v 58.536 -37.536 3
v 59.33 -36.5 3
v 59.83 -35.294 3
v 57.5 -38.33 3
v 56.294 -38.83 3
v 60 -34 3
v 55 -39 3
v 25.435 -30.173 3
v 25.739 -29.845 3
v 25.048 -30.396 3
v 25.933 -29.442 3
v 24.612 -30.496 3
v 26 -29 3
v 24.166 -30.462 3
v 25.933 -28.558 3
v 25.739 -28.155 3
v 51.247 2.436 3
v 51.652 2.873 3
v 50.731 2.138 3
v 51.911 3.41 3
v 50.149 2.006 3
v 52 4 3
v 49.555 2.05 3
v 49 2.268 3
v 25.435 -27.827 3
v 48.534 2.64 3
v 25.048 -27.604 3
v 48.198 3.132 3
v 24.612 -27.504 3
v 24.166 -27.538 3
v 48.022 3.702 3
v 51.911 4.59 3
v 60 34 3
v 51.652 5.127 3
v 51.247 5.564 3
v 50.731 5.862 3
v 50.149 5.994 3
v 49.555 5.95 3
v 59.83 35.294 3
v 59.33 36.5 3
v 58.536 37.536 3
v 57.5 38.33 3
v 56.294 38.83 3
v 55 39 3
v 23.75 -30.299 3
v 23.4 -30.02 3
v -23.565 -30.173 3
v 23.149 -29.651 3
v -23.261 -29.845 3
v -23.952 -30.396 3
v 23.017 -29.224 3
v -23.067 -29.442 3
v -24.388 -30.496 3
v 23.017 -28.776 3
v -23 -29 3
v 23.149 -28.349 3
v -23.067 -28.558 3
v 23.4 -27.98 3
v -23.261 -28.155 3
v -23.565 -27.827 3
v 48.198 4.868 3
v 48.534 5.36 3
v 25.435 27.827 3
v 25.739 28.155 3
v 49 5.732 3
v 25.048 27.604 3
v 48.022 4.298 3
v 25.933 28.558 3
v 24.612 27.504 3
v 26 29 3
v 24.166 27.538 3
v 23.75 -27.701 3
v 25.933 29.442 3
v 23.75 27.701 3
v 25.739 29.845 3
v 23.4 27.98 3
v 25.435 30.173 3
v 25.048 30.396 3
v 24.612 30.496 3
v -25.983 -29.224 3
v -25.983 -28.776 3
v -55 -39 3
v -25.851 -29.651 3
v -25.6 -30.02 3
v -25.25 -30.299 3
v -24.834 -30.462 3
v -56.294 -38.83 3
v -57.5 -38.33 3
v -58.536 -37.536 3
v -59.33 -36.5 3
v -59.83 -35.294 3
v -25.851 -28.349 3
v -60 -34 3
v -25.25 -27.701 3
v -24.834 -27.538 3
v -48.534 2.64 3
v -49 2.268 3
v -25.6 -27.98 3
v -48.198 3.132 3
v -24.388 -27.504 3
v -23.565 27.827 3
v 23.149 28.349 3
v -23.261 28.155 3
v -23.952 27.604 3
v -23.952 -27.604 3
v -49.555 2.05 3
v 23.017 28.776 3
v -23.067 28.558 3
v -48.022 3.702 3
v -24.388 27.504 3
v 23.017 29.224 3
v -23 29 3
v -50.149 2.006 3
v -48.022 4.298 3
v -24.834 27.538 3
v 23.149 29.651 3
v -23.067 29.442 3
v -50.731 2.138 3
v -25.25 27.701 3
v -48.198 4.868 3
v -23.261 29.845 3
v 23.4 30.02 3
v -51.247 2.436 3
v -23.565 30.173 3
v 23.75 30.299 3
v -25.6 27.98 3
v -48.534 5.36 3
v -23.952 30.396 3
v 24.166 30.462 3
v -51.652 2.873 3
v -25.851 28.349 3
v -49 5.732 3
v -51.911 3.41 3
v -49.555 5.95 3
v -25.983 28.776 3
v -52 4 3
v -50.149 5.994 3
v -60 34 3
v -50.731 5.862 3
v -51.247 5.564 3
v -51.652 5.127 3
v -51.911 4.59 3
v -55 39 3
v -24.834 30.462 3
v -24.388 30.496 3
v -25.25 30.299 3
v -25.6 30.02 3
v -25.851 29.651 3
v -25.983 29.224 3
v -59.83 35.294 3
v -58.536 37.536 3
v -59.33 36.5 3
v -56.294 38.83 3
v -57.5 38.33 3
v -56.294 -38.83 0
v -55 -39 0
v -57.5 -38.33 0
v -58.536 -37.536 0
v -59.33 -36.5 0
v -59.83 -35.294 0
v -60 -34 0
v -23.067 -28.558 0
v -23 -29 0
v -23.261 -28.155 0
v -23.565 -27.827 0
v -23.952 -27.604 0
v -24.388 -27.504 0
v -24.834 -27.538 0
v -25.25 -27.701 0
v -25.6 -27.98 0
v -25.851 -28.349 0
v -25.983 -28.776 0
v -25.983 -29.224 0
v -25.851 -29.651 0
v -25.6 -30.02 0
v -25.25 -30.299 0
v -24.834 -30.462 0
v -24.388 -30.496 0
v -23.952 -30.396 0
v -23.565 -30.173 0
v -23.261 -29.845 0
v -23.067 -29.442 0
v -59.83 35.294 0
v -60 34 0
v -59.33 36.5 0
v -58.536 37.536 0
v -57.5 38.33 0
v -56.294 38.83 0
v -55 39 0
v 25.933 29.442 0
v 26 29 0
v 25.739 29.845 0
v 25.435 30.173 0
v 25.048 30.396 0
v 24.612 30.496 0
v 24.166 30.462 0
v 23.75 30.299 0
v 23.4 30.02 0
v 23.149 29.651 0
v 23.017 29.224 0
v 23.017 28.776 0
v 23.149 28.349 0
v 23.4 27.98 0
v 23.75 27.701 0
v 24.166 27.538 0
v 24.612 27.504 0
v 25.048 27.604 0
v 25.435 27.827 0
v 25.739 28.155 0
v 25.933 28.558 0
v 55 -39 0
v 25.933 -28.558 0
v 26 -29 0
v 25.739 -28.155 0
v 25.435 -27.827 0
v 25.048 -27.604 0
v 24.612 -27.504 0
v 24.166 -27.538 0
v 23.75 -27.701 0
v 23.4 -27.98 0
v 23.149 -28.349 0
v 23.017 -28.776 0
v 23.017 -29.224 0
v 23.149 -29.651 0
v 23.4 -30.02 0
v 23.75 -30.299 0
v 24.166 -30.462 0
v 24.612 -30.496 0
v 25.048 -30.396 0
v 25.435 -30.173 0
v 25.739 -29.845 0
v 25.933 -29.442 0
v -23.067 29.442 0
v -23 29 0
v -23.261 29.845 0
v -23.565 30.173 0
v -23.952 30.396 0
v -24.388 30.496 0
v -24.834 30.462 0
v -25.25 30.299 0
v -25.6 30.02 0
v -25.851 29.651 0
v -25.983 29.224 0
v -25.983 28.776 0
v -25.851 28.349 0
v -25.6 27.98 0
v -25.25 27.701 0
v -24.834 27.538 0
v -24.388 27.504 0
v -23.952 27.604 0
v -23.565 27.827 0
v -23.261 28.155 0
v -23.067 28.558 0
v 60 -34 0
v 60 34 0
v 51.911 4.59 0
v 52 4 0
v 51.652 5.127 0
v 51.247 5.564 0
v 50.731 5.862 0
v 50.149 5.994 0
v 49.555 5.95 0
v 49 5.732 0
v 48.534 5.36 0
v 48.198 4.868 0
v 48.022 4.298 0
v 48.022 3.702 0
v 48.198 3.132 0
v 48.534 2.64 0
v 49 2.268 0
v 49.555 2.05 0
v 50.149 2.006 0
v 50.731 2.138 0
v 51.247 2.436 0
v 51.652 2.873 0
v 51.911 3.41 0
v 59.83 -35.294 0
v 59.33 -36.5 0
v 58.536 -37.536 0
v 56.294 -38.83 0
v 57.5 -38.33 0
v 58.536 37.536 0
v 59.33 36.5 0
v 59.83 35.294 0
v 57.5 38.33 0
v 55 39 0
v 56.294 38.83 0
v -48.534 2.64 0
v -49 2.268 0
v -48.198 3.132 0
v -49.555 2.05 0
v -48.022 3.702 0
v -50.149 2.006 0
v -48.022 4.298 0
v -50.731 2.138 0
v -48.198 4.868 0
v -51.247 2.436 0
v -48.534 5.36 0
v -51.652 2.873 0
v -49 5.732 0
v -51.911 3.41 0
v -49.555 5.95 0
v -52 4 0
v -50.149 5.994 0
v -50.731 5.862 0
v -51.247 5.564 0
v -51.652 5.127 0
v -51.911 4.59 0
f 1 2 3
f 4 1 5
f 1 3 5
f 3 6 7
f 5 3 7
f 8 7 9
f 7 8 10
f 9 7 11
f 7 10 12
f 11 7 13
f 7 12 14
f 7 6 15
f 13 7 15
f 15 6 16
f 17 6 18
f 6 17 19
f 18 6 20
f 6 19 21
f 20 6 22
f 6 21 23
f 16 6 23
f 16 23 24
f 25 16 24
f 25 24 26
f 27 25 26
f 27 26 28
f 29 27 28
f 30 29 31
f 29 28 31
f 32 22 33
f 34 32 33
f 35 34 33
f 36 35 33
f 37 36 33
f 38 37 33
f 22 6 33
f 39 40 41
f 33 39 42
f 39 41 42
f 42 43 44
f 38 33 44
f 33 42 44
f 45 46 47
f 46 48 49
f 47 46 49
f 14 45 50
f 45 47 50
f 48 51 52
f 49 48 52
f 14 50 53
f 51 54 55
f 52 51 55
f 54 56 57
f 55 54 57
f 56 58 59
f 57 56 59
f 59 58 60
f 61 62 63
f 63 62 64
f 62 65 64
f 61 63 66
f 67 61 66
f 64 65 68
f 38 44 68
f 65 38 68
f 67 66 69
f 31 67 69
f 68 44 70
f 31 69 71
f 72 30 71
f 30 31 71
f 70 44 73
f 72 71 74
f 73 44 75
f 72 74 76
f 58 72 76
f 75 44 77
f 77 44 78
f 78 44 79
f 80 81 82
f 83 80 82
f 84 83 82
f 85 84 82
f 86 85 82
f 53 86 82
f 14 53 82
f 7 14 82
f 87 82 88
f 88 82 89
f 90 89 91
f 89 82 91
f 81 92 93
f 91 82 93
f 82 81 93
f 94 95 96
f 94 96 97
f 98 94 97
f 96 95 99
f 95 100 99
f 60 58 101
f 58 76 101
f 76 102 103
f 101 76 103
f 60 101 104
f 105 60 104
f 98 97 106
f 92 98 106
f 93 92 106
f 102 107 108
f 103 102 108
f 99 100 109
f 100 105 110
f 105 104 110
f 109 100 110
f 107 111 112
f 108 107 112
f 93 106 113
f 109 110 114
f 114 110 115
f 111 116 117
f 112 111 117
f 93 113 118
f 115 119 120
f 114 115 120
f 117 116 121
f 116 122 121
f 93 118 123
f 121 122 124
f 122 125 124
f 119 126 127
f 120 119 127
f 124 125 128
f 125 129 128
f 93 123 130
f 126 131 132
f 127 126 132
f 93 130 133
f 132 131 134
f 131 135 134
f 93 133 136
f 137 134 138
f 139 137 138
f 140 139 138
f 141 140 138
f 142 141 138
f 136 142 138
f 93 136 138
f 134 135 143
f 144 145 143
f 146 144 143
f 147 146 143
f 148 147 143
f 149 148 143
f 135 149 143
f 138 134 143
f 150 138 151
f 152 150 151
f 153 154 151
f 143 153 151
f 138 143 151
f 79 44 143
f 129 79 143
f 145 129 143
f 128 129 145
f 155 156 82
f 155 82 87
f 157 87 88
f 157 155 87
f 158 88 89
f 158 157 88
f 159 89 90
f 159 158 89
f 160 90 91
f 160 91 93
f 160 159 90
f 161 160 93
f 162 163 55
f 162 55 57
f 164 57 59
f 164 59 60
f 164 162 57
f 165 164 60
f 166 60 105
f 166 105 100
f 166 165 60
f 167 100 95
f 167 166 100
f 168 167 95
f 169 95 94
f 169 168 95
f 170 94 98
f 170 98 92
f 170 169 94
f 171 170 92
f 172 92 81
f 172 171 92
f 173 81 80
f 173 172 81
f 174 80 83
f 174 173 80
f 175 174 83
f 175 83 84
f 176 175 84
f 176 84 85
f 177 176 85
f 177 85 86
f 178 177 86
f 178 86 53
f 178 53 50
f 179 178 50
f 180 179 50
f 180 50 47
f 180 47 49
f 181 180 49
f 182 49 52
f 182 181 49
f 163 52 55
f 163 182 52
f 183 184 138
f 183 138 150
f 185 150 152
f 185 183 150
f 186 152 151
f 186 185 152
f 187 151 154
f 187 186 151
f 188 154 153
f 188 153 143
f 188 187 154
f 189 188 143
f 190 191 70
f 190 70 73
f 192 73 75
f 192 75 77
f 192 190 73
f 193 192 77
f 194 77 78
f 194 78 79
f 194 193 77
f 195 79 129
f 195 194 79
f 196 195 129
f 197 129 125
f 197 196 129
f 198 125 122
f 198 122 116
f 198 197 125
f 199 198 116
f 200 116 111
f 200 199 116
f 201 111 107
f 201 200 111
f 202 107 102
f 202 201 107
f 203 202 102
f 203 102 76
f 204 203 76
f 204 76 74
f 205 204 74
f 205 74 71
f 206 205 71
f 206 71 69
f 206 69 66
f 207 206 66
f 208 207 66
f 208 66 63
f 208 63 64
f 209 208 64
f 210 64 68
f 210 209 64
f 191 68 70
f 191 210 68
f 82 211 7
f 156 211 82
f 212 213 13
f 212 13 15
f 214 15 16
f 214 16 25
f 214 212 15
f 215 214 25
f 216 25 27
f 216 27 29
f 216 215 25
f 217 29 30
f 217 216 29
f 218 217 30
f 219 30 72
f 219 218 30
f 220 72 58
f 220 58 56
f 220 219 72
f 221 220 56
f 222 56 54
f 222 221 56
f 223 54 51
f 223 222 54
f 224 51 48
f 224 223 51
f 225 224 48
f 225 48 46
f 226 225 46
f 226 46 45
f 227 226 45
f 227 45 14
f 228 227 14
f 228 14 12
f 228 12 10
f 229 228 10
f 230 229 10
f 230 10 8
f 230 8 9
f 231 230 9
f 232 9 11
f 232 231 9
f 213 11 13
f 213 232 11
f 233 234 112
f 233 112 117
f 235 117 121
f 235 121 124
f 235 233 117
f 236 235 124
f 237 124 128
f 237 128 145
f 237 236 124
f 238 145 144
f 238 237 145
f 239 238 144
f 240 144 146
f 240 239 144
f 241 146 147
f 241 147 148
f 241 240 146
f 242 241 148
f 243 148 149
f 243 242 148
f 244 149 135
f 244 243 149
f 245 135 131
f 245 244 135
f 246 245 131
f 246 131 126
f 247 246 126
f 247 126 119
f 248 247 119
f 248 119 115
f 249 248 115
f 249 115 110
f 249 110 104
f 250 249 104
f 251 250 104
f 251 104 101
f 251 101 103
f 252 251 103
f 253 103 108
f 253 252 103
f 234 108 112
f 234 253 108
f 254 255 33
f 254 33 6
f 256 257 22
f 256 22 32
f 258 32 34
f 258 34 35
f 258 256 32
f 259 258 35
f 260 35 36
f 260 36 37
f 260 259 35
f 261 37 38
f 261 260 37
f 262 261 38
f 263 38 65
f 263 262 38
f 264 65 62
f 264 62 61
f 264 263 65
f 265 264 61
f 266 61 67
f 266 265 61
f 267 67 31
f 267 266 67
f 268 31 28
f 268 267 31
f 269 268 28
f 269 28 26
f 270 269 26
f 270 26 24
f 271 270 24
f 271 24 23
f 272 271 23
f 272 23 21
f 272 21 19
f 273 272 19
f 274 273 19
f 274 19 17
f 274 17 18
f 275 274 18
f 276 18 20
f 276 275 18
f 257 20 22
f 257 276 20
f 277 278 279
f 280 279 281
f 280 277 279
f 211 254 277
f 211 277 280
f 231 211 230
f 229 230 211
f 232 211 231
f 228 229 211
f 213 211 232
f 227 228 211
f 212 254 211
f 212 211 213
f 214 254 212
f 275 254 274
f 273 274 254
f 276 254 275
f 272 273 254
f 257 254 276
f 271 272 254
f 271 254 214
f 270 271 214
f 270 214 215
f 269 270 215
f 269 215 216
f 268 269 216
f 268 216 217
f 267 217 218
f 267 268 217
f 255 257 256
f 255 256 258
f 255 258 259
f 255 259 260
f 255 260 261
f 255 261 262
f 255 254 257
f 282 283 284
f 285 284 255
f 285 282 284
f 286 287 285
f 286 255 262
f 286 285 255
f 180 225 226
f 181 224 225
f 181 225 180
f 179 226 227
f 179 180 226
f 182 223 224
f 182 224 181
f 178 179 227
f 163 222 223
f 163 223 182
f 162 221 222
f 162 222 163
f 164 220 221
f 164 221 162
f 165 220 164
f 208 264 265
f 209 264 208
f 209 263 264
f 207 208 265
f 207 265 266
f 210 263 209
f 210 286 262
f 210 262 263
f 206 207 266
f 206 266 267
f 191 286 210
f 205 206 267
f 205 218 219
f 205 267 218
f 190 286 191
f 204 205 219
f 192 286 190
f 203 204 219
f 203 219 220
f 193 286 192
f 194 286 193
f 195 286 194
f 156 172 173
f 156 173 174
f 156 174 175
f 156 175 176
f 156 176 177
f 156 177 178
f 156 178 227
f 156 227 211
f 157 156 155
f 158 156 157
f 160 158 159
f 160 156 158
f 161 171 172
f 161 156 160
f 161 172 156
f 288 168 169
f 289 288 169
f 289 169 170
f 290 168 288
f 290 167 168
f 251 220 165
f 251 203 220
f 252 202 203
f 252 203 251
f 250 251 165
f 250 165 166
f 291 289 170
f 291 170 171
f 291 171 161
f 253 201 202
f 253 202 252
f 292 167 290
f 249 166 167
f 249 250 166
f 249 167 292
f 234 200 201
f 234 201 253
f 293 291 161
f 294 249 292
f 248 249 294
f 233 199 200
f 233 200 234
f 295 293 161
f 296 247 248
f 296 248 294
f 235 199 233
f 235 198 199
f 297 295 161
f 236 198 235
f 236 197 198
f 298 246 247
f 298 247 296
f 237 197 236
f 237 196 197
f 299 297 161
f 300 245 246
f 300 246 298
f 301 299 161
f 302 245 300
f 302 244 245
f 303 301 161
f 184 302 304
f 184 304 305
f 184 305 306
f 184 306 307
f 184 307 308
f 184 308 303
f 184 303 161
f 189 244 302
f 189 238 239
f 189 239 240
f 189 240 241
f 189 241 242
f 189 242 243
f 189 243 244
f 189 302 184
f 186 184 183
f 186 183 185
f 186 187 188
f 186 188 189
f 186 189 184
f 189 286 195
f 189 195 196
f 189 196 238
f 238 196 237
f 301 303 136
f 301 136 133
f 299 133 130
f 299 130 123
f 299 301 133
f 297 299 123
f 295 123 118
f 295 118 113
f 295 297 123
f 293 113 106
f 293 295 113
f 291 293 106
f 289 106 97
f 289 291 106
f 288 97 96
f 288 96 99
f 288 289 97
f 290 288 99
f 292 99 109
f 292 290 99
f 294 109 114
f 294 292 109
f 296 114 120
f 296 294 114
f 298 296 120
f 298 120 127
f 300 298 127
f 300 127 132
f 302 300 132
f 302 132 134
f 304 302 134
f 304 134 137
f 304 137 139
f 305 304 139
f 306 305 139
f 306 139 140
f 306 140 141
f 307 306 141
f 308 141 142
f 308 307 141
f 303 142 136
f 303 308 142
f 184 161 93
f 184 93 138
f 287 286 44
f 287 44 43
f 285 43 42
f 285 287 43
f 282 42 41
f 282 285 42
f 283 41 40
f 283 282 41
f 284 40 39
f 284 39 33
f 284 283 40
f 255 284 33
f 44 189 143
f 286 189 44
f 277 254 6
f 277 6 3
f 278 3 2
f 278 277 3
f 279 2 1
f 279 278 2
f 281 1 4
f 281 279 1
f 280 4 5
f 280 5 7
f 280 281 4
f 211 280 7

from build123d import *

# Parameters (mm, degrees)
SKETCH_1_R      = 1.5
SKETCH_1_R_2    = 2
EXTRUDE_1_DEPTH = 3


with BuildPart() as part:
    # 草圖1 → 填料-伸長1 (new body)
    with BuildSketch(Plane.XY):
        with BuildLine():
            Line((-55, 39), (55, 39))
            ThreePointArc((55, 39), (58.535533906, 37.535533906), (60, 34))
            Line((60, 34), (60, -34))
            ThreePointArc((60, -34), (58.535533906, -37.535533906), (55, -39))
            Line((55, -39), (-55, -39))
            ThreePointArc((-55, -39), (-58.535533906, -37.535533906), (-60, -34))
            Line((-60, -34), (-60, 34))
            ThreePointArc((-60, 34), (-58.535533906, 37.535533906), (-55, 39))
        make_face()
        with Locations((-24.5, 29)):
            Circle(SKETCH_1_R, mode=Mode.SUBTRACT)
        with Locations((24.5, 29)):
            Circle(SKETCH_1_R, mode=Mode.SUBTRACT)
        with Locations((-24.5, -29)):
            Circle(SKETCH_1_R, mode=Mode.SUBTRACT)
        with Locations((24.5, -29)):
            Circle(SKETCH_1_R, mode=Mode.SUBTRACT)
        with Locations((50, 4)):
            Circle(SKETCH_1_R_2, mode=Mode.SUBTRACT)
        with Locations(Location((-50, 4, 0), (0, 0, 180))):
            Circle(SKETCH_1_R_2, mode=Mode.SUBTRACT)
    extrude(amount=EXTRUDE_1_DEPTH)


solid = part.part
